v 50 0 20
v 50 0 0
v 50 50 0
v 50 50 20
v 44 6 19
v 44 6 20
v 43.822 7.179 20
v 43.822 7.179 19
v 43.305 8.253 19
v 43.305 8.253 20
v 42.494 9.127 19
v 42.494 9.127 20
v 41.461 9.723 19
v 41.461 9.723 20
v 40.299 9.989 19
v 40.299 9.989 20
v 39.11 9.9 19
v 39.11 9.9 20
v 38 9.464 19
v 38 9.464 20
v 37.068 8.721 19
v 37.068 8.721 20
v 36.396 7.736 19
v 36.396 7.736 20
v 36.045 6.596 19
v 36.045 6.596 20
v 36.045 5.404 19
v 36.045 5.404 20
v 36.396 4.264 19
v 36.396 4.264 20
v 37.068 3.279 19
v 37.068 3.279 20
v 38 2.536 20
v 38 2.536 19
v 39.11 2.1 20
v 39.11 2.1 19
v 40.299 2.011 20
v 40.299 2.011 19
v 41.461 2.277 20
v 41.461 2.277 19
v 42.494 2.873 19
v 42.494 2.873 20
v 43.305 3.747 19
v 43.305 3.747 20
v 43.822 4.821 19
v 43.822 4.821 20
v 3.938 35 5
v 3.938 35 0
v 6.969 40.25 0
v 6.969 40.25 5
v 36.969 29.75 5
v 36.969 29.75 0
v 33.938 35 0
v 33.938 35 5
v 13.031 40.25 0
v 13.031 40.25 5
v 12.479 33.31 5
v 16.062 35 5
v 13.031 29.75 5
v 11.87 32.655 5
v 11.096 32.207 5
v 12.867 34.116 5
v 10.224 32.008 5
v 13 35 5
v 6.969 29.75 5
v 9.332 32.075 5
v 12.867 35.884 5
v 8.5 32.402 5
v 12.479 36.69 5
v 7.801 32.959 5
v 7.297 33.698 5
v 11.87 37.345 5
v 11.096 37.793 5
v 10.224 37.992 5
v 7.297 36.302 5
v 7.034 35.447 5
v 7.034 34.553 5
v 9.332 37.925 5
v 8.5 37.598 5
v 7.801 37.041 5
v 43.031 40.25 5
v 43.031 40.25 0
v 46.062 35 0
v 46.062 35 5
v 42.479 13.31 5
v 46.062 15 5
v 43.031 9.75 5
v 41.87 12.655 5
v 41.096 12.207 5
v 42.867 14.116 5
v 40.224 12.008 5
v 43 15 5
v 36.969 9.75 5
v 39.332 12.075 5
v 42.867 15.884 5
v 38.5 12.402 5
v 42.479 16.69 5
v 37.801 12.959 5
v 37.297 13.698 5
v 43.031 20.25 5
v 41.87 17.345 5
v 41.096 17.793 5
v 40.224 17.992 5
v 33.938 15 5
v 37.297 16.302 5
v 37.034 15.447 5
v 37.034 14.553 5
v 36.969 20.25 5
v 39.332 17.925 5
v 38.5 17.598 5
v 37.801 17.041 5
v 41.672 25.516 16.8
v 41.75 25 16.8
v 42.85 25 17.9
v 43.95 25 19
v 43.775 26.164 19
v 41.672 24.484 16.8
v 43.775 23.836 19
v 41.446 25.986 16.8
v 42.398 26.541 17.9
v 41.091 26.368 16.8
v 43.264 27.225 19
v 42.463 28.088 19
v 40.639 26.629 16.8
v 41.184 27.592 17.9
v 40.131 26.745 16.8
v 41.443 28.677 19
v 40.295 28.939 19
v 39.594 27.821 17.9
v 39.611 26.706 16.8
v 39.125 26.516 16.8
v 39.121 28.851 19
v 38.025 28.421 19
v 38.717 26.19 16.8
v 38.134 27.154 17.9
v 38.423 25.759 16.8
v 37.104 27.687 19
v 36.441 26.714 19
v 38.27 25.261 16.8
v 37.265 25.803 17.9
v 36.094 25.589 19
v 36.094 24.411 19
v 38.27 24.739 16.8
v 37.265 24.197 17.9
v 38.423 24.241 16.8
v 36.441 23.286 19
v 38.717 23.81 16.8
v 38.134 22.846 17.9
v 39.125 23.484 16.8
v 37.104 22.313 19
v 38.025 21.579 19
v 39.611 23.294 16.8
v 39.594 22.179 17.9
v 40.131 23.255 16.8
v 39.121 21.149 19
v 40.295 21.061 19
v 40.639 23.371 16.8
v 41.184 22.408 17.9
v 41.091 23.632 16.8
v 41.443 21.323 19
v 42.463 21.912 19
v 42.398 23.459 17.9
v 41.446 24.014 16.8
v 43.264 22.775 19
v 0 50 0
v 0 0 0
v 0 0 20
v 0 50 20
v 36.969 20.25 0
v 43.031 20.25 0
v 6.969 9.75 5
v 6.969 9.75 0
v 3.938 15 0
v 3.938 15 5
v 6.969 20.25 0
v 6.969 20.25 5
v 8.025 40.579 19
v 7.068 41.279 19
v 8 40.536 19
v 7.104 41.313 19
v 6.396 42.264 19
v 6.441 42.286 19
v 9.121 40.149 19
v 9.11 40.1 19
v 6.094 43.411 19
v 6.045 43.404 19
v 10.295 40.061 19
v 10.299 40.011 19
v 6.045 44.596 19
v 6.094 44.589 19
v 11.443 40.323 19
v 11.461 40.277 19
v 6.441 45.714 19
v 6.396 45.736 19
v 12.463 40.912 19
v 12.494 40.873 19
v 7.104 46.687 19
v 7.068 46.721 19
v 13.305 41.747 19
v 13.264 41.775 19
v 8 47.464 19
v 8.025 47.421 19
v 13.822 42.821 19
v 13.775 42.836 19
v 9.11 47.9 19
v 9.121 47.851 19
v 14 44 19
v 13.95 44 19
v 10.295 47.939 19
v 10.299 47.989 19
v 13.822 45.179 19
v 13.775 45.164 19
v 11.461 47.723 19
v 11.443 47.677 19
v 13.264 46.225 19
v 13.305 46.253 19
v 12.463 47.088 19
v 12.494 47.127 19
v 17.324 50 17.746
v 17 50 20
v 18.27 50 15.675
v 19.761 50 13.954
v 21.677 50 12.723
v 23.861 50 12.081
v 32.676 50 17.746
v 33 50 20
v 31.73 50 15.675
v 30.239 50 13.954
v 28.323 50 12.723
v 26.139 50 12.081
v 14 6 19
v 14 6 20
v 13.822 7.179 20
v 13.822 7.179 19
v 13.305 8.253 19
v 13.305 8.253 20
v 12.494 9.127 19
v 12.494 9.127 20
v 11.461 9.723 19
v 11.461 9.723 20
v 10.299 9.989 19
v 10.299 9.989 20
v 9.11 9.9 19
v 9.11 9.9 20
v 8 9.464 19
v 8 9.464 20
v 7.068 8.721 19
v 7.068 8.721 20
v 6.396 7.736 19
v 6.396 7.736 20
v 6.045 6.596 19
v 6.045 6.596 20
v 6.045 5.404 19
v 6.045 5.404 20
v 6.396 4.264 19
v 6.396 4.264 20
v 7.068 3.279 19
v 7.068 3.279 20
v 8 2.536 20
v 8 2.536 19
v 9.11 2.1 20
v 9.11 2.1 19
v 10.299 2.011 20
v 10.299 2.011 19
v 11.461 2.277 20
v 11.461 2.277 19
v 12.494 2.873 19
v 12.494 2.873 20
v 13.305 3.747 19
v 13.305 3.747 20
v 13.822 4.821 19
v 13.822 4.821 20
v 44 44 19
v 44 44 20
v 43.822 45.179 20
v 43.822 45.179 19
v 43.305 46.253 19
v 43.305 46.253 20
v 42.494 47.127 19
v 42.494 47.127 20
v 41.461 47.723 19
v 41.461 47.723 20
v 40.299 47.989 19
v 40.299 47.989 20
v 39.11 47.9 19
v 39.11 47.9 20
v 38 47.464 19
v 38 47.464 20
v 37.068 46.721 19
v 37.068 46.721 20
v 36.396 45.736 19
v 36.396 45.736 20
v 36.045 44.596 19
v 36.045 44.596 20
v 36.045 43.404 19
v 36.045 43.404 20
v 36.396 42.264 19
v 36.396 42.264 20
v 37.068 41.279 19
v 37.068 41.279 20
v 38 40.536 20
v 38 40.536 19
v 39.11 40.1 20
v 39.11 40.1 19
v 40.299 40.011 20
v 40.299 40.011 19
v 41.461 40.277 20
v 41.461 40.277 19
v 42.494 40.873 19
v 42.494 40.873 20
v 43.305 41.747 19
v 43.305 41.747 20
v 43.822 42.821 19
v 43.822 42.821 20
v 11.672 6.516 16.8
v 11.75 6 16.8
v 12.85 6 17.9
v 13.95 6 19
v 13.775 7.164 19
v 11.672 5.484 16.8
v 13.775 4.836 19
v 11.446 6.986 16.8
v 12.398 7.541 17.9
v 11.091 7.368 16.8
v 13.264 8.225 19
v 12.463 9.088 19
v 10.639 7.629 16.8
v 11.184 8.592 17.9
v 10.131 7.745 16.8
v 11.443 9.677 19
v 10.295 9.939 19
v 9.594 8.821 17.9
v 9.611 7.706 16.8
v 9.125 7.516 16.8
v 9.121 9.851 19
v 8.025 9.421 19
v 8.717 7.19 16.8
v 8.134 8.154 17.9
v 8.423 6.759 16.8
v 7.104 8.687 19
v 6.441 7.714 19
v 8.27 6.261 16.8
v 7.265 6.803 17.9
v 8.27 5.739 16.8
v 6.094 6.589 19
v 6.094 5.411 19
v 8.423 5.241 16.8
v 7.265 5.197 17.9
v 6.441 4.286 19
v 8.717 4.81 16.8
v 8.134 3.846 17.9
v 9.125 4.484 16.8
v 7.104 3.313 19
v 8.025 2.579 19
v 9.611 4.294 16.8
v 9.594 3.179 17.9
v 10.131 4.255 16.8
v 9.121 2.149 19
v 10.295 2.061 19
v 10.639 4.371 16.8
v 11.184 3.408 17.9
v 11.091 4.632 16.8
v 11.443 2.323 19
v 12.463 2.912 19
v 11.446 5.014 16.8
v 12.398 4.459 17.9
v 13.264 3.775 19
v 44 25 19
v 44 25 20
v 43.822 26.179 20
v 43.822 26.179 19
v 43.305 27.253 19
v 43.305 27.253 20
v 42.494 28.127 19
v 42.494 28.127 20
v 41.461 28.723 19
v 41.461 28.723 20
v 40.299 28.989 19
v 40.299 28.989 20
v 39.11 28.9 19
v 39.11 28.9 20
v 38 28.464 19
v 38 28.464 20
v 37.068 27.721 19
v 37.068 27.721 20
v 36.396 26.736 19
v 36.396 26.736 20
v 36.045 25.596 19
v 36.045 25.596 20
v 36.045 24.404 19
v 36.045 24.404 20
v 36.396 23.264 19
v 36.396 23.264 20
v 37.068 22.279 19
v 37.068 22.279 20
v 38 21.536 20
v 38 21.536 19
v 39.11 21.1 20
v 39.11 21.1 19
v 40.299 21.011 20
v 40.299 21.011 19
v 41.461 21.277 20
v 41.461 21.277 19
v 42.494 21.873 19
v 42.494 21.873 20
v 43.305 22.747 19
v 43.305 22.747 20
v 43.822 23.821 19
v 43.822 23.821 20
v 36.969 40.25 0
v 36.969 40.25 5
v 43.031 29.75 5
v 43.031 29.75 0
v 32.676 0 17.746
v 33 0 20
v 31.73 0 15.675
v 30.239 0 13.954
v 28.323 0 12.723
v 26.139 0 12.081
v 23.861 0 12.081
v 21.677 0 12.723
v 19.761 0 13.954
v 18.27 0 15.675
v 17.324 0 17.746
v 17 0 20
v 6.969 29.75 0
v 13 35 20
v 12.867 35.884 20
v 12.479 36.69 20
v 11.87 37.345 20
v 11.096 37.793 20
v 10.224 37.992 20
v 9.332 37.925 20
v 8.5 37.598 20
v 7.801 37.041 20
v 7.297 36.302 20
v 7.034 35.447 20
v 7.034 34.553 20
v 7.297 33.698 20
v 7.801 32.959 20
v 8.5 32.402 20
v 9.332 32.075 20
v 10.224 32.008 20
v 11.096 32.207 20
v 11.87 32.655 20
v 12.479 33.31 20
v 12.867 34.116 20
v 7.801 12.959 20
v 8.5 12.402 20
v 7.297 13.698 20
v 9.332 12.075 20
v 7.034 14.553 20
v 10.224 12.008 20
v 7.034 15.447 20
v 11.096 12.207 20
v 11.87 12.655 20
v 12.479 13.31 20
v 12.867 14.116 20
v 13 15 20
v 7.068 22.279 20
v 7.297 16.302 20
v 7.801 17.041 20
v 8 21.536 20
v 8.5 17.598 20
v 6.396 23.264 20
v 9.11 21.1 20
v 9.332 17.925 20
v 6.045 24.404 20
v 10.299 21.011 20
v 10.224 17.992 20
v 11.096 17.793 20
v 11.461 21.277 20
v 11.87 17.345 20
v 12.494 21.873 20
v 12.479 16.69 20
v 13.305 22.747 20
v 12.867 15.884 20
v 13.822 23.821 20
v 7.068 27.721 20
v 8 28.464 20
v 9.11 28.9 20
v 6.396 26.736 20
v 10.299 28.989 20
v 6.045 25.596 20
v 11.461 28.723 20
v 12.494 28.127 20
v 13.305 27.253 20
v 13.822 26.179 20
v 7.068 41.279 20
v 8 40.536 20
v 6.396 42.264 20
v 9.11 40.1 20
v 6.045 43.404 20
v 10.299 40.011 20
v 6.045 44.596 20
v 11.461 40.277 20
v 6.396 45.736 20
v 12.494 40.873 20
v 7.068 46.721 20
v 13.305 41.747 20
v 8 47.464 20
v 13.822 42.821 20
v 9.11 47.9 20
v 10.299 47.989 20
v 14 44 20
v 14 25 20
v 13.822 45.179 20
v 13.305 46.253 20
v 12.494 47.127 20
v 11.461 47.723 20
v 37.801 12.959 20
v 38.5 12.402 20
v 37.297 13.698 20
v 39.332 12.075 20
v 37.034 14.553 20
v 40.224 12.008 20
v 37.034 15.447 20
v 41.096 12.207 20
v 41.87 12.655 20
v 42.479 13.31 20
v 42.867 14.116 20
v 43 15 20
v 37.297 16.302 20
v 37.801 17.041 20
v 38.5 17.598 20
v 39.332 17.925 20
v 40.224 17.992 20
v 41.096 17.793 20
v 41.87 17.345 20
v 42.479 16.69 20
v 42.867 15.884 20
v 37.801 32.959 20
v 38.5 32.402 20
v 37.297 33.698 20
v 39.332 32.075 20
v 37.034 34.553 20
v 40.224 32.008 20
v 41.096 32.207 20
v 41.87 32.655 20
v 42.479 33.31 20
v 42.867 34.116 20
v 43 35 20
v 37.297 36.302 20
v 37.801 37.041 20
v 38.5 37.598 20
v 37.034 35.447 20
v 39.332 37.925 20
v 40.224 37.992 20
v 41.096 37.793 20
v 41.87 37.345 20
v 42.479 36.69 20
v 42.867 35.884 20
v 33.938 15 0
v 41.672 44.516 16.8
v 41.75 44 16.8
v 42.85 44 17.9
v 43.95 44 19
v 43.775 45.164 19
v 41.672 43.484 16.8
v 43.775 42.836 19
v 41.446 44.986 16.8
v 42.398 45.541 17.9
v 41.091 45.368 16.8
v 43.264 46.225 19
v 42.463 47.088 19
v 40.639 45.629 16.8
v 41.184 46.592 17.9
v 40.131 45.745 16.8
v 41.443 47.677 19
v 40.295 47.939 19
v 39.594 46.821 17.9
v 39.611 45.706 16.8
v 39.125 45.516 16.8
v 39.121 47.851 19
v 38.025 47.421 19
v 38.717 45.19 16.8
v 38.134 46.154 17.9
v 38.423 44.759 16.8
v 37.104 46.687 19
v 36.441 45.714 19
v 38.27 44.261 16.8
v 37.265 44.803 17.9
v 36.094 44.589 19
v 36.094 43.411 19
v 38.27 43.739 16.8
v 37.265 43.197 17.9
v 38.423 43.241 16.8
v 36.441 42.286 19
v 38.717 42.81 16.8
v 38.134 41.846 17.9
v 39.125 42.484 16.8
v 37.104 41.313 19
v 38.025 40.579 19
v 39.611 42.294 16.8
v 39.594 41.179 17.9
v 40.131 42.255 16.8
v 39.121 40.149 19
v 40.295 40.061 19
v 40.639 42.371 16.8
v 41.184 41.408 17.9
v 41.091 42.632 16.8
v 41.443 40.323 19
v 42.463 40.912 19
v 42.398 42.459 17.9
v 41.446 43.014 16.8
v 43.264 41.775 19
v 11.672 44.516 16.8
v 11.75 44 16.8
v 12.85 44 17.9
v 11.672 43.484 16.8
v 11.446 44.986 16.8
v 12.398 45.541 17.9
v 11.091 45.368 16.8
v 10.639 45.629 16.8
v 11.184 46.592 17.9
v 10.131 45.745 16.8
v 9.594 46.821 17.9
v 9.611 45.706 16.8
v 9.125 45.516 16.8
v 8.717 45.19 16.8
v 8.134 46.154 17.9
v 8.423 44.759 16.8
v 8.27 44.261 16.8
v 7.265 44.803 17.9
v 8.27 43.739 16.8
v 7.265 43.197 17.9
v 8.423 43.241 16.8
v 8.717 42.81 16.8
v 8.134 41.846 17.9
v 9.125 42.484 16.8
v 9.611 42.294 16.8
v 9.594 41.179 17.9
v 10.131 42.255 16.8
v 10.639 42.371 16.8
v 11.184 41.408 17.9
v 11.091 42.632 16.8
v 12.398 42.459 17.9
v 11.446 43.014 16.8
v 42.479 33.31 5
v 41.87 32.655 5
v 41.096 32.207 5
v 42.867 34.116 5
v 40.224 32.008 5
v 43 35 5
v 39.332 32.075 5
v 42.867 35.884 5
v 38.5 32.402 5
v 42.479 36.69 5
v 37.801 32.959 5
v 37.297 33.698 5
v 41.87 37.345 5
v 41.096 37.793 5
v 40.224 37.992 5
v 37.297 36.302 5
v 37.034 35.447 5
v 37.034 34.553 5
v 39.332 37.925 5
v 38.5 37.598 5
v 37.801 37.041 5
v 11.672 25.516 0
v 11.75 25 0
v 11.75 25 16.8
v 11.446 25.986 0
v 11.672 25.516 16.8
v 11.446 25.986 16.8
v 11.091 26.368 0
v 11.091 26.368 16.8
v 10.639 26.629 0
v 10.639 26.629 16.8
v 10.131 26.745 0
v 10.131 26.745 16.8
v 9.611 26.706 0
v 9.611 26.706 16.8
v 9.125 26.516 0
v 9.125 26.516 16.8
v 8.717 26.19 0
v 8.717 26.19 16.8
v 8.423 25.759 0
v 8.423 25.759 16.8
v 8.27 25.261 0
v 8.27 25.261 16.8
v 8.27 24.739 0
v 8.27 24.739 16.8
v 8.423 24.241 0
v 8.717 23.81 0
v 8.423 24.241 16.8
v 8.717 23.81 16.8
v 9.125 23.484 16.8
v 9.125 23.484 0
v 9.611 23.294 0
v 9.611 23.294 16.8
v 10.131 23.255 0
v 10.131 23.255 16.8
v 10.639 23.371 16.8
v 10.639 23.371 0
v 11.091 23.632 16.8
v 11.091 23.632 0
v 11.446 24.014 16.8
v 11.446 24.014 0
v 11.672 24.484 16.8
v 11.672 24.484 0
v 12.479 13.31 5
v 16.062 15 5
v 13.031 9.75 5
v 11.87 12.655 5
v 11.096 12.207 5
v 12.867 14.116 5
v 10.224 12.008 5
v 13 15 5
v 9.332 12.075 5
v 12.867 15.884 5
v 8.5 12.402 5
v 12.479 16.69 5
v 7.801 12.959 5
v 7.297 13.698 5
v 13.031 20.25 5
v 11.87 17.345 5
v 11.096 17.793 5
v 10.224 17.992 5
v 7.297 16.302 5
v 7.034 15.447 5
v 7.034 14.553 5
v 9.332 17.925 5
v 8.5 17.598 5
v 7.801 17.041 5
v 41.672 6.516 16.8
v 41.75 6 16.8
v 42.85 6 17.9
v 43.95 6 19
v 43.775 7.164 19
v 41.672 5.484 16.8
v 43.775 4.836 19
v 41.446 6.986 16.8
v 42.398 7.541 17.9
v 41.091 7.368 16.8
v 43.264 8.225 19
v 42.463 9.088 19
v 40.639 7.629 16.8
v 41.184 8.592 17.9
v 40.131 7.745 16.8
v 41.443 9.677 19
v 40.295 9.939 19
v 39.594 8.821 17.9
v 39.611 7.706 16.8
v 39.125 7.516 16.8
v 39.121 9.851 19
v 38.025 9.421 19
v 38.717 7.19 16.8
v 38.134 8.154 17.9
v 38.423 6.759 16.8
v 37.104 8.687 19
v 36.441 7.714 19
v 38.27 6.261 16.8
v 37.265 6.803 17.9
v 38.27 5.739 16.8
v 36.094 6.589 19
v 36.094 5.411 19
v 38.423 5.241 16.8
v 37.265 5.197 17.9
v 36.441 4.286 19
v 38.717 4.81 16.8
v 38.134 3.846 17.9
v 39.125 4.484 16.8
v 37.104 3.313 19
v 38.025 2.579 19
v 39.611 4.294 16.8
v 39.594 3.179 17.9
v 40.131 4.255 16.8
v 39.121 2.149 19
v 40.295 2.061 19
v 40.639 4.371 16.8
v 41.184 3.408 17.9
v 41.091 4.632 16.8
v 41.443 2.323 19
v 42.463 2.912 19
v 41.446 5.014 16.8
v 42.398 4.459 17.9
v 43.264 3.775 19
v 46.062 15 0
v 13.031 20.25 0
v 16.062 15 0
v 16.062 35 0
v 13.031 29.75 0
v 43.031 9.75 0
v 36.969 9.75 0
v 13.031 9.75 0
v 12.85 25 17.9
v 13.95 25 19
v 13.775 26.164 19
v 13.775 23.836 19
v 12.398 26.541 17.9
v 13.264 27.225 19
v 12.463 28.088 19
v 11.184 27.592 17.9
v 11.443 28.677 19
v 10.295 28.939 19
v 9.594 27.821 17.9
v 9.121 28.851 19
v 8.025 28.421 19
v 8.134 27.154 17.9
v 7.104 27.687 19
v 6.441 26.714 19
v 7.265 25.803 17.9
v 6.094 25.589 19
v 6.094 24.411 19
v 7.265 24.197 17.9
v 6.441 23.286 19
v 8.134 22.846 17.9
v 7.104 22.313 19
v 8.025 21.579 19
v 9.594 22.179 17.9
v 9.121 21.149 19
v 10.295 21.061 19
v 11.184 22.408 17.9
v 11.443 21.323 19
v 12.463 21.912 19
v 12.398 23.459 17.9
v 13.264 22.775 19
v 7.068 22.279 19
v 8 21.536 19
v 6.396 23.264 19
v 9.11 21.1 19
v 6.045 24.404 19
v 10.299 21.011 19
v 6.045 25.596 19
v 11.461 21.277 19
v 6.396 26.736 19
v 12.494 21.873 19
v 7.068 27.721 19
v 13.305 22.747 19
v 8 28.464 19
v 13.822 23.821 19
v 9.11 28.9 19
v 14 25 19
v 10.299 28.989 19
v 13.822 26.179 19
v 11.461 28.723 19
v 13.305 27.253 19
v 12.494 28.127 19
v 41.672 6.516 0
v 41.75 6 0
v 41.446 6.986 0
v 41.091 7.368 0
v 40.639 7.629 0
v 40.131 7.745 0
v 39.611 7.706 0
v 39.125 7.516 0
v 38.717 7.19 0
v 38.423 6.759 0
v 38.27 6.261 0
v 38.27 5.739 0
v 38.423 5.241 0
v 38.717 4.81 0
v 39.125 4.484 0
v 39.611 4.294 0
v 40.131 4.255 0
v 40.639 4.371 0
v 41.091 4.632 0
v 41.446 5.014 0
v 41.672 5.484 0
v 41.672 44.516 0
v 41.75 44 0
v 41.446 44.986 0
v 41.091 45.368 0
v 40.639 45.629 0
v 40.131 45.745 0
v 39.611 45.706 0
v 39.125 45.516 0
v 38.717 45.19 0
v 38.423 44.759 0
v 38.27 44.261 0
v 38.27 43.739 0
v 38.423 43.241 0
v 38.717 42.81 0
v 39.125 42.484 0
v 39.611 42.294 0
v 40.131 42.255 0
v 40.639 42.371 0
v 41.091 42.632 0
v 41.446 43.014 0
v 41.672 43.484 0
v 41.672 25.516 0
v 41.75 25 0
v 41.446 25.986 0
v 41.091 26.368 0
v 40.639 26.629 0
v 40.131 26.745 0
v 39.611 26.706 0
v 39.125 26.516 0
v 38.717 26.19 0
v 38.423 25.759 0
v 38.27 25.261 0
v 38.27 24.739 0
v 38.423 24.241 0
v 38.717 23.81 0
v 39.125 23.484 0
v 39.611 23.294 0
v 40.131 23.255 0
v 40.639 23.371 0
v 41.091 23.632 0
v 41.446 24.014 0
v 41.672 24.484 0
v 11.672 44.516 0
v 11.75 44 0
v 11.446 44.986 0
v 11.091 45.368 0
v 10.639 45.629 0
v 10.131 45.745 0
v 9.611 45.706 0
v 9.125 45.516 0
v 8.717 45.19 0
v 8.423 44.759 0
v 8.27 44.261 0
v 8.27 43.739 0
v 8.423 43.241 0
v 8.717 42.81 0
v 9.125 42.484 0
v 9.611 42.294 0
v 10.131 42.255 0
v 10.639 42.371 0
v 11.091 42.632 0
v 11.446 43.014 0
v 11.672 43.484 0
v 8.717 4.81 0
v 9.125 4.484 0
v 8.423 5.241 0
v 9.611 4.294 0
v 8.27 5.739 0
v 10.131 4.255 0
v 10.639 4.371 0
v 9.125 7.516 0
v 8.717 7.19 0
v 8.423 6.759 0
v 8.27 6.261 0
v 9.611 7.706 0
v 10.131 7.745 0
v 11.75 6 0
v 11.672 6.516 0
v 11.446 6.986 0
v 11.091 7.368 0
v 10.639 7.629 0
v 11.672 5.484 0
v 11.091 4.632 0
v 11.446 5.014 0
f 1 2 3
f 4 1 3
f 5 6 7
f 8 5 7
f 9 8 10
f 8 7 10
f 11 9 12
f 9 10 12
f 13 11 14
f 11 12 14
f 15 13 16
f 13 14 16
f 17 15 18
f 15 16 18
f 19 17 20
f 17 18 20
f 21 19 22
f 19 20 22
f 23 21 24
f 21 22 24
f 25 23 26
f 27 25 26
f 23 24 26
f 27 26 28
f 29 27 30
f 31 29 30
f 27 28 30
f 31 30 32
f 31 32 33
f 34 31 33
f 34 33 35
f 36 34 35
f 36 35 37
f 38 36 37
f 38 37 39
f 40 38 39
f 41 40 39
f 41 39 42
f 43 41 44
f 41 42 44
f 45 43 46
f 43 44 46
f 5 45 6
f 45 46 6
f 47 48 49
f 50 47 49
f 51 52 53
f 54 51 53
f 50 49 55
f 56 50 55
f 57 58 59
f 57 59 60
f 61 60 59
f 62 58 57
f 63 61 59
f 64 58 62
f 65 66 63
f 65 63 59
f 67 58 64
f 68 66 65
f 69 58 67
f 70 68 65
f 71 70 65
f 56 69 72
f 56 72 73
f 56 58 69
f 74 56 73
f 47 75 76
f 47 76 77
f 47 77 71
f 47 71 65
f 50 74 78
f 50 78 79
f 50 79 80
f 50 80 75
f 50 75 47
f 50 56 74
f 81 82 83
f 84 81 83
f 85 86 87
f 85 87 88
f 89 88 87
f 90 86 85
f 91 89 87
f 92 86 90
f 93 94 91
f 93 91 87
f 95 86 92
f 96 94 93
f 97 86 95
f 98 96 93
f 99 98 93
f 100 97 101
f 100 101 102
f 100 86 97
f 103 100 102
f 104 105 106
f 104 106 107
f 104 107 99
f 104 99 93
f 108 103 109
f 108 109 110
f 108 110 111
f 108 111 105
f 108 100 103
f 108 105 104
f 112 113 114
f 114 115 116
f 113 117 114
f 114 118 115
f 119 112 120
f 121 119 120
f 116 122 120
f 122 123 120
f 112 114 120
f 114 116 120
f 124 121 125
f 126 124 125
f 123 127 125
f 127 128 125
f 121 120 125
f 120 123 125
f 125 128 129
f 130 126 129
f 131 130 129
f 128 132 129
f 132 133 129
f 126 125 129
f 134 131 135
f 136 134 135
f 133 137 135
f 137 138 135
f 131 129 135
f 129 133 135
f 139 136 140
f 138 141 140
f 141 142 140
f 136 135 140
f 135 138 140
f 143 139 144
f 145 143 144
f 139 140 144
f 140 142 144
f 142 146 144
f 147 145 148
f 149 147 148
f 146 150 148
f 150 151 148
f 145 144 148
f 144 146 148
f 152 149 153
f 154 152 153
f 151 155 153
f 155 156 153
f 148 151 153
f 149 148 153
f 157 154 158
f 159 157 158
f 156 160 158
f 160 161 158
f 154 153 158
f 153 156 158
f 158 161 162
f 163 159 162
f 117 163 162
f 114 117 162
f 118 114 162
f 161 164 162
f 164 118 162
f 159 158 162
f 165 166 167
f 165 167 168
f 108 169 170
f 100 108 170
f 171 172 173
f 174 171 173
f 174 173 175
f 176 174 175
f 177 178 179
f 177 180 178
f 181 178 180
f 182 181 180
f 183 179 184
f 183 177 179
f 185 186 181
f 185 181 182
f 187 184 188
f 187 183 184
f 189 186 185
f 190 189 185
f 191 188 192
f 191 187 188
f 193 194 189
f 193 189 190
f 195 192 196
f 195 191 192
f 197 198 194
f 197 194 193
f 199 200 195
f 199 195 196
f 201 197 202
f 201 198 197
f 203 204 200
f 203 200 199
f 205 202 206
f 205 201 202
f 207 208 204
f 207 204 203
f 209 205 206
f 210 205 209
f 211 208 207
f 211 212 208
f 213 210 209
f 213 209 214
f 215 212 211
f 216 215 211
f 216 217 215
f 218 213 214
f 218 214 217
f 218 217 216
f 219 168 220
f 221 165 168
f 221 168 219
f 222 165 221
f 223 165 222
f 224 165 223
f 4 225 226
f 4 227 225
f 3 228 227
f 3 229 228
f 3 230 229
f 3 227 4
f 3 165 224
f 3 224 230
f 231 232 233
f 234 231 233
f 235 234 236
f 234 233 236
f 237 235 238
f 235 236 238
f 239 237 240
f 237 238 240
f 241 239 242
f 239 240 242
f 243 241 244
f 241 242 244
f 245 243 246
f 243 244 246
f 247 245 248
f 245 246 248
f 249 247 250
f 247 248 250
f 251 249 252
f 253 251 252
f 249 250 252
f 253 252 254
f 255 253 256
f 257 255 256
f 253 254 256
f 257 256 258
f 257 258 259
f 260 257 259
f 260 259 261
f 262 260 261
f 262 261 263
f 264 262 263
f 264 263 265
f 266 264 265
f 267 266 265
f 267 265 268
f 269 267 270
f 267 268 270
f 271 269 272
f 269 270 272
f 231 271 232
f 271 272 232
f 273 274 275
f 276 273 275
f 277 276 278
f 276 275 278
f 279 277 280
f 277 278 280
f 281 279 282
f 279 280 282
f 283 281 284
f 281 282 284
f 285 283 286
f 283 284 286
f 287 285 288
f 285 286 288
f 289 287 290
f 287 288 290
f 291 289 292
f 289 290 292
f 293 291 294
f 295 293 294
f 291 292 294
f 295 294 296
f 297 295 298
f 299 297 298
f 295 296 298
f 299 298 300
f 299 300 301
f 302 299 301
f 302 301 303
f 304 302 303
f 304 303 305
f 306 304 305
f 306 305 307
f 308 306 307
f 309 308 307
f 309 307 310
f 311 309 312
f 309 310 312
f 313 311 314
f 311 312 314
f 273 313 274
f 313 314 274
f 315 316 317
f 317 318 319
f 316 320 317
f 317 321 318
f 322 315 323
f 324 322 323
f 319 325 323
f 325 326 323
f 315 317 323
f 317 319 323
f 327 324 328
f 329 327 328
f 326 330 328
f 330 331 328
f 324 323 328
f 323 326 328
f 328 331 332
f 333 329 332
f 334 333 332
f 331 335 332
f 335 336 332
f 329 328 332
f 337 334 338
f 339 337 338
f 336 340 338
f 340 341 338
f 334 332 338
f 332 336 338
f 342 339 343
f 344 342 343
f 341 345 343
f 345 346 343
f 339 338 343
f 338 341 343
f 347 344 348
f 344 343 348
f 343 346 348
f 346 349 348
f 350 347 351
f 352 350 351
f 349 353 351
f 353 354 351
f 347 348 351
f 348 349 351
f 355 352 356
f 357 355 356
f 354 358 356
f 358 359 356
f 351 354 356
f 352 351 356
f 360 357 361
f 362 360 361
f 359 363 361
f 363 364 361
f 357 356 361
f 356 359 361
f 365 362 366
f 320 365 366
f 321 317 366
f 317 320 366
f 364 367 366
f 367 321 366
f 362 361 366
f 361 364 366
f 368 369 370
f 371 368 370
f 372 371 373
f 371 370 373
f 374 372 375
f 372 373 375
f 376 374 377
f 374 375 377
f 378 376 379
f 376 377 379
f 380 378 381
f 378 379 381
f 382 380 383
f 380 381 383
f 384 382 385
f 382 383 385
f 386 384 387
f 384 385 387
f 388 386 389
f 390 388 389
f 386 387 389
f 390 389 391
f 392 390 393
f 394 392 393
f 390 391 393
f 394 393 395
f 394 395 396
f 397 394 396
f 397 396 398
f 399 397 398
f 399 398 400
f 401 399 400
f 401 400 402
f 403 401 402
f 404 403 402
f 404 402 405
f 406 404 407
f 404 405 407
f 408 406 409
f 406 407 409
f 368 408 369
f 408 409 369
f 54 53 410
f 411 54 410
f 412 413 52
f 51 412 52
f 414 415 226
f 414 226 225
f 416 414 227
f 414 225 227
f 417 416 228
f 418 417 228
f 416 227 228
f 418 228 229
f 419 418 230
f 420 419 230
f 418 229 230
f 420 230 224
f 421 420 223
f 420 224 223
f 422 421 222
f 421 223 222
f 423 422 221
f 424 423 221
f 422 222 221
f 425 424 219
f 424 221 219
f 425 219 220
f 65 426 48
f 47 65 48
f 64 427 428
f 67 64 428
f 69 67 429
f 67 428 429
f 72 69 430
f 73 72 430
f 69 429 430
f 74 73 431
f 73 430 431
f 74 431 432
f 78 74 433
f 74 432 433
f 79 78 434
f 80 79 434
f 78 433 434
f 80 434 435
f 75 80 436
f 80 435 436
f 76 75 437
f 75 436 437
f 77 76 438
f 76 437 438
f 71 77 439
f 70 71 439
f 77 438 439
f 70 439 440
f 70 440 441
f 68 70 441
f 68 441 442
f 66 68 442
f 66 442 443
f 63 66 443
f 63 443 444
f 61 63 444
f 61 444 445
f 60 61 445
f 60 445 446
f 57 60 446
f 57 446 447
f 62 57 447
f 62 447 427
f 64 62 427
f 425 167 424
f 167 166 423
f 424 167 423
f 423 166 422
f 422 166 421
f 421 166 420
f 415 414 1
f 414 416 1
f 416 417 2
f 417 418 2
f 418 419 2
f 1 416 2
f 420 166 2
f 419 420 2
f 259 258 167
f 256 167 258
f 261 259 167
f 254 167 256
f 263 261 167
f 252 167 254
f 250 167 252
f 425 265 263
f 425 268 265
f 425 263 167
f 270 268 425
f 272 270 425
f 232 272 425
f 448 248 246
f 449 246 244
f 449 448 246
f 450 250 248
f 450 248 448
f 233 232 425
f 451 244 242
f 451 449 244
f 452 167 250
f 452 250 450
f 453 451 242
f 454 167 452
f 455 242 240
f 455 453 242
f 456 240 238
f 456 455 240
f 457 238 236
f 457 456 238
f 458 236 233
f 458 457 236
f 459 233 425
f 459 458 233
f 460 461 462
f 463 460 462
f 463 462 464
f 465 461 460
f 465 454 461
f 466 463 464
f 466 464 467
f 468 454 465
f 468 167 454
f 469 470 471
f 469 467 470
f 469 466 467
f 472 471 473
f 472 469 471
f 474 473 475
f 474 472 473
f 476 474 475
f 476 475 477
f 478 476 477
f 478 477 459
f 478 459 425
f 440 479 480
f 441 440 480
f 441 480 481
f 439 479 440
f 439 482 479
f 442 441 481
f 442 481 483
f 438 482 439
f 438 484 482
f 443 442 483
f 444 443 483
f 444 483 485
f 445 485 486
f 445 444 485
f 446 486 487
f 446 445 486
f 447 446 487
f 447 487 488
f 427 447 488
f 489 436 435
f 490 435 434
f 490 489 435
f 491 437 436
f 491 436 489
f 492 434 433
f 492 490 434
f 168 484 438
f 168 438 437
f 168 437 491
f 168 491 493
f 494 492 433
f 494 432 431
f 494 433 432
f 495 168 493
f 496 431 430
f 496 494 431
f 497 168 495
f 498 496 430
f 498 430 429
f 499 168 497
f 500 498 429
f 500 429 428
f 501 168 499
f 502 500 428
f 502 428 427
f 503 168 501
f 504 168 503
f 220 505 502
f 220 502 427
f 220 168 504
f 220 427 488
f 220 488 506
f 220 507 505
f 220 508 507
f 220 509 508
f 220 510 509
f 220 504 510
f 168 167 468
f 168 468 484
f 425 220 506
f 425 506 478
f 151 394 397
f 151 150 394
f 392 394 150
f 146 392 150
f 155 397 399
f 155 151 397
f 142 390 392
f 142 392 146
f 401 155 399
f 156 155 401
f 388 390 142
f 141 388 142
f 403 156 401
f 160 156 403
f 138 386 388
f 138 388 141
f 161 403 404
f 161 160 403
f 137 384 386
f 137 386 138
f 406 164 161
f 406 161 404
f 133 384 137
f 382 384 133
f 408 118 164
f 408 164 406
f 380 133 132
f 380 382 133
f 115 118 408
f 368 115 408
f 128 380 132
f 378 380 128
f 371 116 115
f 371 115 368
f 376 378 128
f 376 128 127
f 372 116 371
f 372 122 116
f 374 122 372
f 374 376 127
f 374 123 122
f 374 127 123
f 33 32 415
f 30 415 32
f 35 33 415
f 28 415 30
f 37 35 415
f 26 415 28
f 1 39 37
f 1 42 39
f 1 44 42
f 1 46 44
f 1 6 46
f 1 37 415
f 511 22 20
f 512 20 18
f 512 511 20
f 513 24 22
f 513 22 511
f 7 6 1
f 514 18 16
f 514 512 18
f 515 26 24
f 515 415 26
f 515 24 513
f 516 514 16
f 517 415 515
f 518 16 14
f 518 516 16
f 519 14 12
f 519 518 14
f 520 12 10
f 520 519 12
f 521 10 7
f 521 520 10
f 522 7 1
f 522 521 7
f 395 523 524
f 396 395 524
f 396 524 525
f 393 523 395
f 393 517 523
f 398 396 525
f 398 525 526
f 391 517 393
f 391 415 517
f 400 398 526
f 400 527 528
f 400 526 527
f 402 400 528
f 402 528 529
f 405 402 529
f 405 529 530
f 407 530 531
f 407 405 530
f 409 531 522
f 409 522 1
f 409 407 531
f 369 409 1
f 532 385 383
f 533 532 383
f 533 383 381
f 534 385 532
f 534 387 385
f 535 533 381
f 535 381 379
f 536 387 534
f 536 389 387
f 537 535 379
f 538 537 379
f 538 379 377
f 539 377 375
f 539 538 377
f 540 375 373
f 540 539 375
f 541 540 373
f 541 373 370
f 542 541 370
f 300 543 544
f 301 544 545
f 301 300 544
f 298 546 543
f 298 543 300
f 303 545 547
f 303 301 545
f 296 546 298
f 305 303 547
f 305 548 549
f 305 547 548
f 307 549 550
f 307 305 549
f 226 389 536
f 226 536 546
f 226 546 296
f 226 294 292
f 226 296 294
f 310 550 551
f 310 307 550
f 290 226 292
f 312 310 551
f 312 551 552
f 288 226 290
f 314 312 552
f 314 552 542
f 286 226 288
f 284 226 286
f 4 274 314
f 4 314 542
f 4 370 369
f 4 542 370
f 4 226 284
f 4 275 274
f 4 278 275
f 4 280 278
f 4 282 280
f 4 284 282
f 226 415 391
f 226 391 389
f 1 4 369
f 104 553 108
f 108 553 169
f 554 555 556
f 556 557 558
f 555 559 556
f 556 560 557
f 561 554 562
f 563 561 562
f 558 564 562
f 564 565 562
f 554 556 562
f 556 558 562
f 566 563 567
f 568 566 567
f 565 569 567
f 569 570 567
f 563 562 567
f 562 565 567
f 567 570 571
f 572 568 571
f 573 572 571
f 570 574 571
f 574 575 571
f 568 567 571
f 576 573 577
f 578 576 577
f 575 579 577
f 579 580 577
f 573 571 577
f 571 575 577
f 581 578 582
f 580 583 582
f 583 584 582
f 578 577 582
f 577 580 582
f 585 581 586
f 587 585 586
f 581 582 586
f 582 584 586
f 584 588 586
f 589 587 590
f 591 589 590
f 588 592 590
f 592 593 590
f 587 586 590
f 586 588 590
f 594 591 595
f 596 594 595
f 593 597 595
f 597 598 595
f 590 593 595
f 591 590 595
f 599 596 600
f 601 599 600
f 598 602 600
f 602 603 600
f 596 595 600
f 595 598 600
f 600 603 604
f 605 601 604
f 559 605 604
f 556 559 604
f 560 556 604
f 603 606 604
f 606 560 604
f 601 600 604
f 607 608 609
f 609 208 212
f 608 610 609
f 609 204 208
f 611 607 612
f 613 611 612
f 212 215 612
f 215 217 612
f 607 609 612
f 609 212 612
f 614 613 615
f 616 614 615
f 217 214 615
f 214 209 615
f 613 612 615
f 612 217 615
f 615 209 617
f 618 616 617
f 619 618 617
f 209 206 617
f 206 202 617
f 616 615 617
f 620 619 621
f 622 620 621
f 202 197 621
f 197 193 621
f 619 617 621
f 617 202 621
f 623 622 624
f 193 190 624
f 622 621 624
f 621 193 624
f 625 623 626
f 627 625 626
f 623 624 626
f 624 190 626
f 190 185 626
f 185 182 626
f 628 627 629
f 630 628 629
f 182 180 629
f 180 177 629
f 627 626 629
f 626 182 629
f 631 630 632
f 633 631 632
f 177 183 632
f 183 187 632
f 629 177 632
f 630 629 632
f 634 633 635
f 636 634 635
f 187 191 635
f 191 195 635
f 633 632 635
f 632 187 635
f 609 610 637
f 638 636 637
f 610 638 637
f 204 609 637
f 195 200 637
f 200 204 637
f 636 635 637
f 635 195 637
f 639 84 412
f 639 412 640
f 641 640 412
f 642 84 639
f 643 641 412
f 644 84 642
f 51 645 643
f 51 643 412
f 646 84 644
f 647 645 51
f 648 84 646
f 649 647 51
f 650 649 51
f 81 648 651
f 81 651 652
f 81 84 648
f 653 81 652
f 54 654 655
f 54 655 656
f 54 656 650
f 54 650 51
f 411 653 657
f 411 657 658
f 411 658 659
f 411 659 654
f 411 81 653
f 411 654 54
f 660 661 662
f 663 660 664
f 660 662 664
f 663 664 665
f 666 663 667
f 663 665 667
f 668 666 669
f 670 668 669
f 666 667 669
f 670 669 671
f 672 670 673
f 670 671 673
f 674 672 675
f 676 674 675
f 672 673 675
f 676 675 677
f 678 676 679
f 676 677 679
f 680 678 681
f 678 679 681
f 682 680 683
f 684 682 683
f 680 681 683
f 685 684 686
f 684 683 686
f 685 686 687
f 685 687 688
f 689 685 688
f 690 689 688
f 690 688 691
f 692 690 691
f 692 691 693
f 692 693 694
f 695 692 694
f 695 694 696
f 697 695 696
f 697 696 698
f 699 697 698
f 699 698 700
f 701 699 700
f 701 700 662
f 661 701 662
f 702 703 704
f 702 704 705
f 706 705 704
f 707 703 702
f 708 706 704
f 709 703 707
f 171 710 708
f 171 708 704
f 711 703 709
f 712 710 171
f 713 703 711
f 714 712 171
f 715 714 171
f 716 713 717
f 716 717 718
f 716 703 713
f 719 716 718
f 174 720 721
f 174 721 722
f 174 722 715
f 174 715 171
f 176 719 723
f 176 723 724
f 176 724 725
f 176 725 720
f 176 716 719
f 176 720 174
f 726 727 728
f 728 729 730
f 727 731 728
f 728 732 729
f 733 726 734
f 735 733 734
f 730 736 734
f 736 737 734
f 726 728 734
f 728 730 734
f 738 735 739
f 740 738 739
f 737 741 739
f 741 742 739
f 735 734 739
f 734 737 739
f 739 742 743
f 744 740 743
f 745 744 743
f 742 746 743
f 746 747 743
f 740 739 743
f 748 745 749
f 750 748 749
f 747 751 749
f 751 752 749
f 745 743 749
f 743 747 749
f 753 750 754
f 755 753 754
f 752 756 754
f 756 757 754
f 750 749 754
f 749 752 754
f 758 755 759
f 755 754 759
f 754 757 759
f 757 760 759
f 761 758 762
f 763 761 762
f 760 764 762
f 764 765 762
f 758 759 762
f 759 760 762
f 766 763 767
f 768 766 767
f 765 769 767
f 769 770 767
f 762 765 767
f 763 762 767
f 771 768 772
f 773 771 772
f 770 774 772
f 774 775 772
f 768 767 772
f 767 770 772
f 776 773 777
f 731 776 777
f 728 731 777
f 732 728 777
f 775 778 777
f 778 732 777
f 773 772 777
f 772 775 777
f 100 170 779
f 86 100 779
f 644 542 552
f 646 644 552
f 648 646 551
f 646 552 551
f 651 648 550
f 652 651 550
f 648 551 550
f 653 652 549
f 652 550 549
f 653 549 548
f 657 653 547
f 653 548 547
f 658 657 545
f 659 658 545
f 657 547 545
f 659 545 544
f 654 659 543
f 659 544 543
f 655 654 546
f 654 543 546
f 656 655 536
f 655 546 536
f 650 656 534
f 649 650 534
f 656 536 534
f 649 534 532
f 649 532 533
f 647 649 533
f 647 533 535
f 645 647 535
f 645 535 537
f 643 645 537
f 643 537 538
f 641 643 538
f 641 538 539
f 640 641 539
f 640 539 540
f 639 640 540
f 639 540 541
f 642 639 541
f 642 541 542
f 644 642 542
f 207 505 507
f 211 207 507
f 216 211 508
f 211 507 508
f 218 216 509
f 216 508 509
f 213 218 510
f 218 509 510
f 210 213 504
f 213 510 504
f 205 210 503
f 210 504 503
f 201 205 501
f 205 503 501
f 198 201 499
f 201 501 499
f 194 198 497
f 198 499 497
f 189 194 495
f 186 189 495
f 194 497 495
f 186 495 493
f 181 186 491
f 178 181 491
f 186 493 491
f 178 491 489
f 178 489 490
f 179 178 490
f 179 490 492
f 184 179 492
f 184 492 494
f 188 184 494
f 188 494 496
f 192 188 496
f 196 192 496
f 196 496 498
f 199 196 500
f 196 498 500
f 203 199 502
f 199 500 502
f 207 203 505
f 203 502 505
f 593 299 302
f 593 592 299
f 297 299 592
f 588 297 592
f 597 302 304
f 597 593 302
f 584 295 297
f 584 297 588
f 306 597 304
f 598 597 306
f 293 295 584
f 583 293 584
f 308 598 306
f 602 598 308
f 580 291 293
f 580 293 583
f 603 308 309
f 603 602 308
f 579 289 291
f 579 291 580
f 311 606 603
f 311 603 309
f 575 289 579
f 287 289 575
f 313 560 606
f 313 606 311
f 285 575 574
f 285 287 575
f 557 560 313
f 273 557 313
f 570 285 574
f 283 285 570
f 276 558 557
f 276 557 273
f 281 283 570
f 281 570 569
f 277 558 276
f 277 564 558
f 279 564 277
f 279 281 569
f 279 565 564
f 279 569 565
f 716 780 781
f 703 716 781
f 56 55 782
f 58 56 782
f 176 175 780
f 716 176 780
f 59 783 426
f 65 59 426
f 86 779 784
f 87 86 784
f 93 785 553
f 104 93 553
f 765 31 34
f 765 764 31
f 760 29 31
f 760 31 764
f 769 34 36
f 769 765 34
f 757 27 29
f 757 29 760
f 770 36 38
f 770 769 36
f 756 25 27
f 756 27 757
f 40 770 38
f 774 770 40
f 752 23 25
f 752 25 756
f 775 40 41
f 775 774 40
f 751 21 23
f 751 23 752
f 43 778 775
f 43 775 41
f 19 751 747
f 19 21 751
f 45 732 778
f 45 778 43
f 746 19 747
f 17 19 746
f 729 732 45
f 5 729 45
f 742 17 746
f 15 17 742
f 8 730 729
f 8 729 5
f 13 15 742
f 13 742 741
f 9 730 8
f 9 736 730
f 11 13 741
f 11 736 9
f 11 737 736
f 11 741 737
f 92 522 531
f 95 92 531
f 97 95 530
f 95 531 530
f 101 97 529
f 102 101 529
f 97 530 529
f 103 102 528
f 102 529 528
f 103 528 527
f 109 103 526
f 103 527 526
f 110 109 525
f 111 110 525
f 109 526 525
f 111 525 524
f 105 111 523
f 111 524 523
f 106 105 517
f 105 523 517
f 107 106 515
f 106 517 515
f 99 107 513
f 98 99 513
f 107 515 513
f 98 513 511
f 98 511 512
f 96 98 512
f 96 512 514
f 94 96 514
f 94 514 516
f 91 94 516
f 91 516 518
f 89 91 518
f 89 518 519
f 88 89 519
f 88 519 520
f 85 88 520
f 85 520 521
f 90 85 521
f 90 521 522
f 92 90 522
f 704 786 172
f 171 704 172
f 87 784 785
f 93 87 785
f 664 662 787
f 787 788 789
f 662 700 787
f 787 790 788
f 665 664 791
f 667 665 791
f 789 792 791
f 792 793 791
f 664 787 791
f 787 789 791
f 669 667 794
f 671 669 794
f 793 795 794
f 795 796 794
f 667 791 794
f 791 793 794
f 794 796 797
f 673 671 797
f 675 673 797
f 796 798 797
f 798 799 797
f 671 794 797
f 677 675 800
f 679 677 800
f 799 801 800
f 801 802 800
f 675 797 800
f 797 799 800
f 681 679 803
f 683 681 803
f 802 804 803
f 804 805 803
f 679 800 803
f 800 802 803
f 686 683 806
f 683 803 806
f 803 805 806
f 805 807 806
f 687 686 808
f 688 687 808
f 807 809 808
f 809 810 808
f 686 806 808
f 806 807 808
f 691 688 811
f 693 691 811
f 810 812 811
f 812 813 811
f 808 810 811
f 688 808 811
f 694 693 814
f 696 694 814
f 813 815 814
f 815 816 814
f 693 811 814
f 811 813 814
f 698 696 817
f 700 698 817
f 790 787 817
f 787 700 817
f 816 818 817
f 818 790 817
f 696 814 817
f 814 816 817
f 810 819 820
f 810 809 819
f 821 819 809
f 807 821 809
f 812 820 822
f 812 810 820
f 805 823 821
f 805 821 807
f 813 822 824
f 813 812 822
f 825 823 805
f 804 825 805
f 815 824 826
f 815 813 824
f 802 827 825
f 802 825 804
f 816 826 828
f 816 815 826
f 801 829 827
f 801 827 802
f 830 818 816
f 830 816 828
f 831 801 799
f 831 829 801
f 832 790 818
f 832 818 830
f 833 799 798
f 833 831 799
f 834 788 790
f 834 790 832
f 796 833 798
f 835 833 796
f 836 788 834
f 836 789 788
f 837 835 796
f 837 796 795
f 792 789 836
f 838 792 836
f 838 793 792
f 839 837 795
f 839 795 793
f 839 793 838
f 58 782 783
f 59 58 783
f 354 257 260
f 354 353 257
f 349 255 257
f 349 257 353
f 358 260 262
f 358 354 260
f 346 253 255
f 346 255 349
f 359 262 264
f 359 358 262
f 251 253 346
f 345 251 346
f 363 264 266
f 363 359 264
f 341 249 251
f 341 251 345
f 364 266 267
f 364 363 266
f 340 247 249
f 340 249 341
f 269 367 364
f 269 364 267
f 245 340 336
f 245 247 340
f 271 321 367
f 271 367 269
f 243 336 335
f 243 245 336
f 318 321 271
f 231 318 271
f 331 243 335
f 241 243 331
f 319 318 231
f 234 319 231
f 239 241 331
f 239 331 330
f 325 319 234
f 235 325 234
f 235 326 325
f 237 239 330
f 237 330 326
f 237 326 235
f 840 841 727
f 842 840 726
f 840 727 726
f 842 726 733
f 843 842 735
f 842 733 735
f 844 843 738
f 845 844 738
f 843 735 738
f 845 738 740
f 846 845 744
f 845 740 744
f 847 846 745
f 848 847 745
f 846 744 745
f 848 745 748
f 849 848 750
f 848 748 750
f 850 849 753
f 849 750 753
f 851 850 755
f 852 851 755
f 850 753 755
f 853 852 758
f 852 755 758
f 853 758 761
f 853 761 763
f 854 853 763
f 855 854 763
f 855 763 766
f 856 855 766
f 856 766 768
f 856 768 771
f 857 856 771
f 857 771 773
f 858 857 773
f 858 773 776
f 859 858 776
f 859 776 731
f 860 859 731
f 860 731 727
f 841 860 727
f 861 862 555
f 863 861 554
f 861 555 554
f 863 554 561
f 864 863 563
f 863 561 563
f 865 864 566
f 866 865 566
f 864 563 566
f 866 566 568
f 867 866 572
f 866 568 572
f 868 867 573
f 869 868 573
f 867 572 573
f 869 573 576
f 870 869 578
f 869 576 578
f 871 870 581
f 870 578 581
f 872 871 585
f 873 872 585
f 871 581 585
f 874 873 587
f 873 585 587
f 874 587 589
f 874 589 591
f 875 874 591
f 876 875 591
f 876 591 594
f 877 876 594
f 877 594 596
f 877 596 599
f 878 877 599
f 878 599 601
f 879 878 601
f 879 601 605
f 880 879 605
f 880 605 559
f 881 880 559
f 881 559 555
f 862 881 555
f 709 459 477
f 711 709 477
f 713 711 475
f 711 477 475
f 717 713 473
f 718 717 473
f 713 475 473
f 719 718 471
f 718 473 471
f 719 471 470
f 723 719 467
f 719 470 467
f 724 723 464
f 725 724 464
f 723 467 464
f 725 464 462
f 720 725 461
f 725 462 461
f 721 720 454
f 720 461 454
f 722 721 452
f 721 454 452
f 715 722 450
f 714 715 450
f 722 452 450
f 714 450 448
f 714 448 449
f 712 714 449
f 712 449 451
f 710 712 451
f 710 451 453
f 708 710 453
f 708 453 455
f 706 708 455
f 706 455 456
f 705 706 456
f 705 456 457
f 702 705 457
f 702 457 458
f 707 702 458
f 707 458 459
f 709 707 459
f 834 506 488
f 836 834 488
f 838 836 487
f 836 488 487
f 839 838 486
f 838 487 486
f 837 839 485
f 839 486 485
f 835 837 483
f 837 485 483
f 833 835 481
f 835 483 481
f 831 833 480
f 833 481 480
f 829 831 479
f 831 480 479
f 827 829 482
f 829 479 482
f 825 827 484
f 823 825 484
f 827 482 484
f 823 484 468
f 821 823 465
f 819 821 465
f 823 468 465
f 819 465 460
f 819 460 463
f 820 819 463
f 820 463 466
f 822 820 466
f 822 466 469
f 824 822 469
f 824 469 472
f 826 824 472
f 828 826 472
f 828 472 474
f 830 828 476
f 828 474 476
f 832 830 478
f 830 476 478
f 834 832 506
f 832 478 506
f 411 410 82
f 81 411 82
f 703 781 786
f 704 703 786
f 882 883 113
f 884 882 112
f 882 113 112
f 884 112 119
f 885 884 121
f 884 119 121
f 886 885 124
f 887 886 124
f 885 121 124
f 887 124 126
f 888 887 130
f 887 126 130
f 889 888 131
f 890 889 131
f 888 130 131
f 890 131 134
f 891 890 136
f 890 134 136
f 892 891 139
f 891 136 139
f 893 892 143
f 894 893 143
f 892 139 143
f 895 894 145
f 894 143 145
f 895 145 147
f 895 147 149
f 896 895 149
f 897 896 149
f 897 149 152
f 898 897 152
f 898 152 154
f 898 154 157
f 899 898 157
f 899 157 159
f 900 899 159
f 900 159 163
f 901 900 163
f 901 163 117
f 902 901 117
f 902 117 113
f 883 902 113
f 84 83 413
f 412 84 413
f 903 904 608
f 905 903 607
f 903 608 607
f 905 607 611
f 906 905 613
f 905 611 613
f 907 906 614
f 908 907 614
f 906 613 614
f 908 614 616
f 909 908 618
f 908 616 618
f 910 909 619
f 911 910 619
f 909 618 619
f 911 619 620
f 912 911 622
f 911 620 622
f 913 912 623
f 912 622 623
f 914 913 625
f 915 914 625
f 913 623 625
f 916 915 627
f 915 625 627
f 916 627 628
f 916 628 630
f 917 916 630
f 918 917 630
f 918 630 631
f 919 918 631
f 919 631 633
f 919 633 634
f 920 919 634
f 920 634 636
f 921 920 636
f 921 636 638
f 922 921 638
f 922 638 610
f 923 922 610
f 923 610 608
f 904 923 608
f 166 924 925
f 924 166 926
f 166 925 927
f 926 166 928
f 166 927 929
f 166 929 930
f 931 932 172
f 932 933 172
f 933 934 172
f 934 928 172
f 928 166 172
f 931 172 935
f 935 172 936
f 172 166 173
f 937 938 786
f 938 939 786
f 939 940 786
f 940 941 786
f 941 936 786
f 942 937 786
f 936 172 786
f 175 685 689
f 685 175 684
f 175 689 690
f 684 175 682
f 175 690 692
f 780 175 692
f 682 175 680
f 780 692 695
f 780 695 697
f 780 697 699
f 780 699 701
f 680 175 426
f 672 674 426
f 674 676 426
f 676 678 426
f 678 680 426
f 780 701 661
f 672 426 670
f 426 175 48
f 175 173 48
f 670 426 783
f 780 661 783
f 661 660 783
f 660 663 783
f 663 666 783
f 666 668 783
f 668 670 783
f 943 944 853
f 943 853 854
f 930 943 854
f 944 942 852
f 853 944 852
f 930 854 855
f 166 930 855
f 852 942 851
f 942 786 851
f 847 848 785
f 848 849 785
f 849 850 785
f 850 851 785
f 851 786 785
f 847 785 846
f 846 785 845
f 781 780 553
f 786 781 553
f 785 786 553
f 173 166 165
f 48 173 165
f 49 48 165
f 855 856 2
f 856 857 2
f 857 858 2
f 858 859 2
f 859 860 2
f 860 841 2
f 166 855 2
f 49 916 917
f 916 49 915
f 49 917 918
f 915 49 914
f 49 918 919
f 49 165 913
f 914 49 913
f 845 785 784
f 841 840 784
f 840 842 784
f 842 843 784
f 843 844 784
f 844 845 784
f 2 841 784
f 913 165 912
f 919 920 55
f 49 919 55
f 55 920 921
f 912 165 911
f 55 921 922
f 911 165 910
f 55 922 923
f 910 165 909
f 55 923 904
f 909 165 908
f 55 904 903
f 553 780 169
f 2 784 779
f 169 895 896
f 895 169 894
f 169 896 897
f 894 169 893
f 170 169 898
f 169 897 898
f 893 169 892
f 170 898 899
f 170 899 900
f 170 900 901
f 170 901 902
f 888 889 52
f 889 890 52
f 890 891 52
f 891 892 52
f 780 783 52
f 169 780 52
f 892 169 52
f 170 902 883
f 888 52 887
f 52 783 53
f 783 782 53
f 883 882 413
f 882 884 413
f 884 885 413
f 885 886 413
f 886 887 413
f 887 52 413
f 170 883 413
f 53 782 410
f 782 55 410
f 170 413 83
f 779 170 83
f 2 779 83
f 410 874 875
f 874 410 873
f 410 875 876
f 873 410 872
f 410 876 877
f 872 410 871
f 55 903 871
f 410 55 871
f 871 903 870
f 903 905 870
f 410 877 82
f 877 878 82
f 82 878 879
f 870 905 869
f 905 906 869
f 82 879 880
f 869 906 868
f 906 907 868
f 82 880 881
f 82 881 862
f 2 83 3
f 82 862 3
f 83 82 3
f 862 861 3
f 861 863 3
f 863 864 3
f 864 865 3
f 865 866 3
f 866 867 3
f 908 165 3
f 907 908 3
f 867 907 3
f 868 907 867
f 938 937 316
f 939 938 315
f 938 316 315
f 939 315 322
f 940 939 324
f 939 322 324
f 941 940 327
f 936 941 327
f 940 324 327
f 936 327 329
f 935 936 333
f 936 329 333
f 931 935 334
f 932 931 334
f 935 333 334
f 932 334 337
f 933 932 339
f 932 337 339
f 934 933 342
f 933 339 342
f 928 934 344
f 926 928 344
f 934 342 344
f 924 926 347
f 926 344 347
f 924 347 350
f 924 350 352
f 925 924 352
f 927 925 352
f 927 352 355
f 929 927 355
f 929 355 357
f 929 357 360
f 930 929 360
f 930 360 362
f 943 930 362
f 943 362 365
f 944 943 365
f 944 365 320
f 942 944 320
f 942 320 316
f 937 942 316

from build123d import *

# Parameters (mm, degrees)
SKETCH1_W           = 50
SKETCH1_H           = 50
BOSS_EXTRUDE1_DEPTH = 20
SKETCH2_R           = 8
CUT_EXTRUDE1_DEPTH  = 67.942210384
SKETCH3_R           = 3
CUT_EXTRUDE2_DEPTH  = 43
CUT_EXTRUDE5_DEPTH  = 5
SKETCH7_R           = 1.75
CUT_EXTRUDE6_DEPTH  = 41
SKETCH9_R           = 4
CUT_EXTRUDE7_DEPTH  = 1
CHAMFER1_SIZE       = 2.2


with BuildPart() as part:
    # Sketch1 → Boss-Extrude1 (new body)
    with BuildSketch(Plane.XY):
        with Locations((25, 25)):
            Rectangle(SKETCH1_W, SKETCH1_H)
    extrude(amount=BOSS_EXTRUDE1_DEPTH)

    # Sketch2 → Cut-Extrude1 (cut)
    with BuildSketch(Plane(origin=(0, 50, 0), x_dir=(1, 0, 0), z_dir=(0, 1, 0))):
        with Locations((25, -20)):
            Circle(SKETCH2_R)
    extrude(amount=-CUT_EXTRUDE1_DEPTH, mode=Mode.SUBTRACT)

    # Sketch3 → Cut-Extrude2 (cut)
    with BuildSketch(Plane.XY.offset(20)):
        with Locations((10, 35)):
            Circle(SKETCH3_R)
        with Locations((10, 15)):
            Circle(SKETCH3_R)
        with Locations((40, 35)):
            Circle(SKETCH3_R)
        with Locations((40, 15)):
            Circle(SKETCH3_R)
    extrude(amount=-CUT_EXTRUDE2_DEPTH, mode=Mode.SUBTRACT)

    # Sketch6 → Cut-Extrude5 (cut)
    with BuildSketch(Plane(origin=(0, 0, 0), x_dir=(-1, 0, 0), z_dir=(0, 0, -1))):
        Polygon((-3.937822174, 15), (-6.968911087, 20.25), (-13.031088913, 20.25), (-16.062177826, 15), (-13.031088913, 9.75), (-6.968911087, 9.75), align=None)
        Polygon((-43.031088913, 20.25), (-46.062177826, 15), (-43.031088913, 9.75), (-36.968911087, 9.75), (-33.937822174, 15), (-36.968911087, 20.25), align=None)
        Polygon((-36.968911087, 29.75), (-33.937822174, 35), (-36.968911087, 40.25), (-43.031088913, 40.25), (-46.062177826, 35), (-43.031088913, 29.75), align=None)
        Polygon((-6.968911087, 29.75), (-3.937822174, 35), (-6.968911087, 40.25), (-13.031088913, 40.25), (-16.062177826, 35), (-13.031088913, 29.75), align=None)
    extrude(amount=-CUT_EXTRUDE5_DEPTH, mode=Mode.SUBTRACT)

    # Sketch7 → Cut-Extrude6 (cut)
    with BuildSketch(Plane.XY.offset(20)):
        with Locations((10, 6)):
            Circle(SKETCH7_R)
        with Locations((10, 25)):
            Circle(SKETCH7_R)
        with Locations((10, 44)):
            Circle(SKETCH7_R)
        with Locations((40, 44)):
            Circle(SKETCH7_R)
        with Locations((40, 25)):
            Circle(SKETCH7_R)
        with Locations((40, 6)):
            Circle(SKETCH7_R)
    extrude(amount=-CUT_EXTRUDE6_DEPTH, mode=Mode.SUBTRACT)

    # Sketch9 → Cut-Extrude7 (cut)
    with BuildSketch(Plane.XY.offset(20)):
        with Locations((10, 44)):
            Circle(SKETCH9_R)
        with Locations((10, 25)):
            Circle(SKETCH9_R)
        with Locations((10, 6)):
            Circle(SKETCH9_R)
        with Locations((40, 6)):
            Circle(SKETCH9_R)
        with Locations((40, 25)):
            Circle(SKETCH9_R)
        with Locations((40, 44)):
            Circle(SKETCH9_R)
    extrude(amount=-CUT_EXTRUDE7_DEPTH, mode=Mode.SUBTRACT)

    # Chamfer1
    chamfer1_edges = [part.edges().sort_by_distance(p)[0] for p in [
        (8.25, 44, 19),
        (8.25, 25, 19),
        (8.25, 6, 19),
        (38.25, 6, 19),
        (38.25, 25, 19),
        (38.25, 44, 19),
    ]]
    chamfer(chamfer1_edges, length=CHAMFER1_SIZE)


solid = part.part
